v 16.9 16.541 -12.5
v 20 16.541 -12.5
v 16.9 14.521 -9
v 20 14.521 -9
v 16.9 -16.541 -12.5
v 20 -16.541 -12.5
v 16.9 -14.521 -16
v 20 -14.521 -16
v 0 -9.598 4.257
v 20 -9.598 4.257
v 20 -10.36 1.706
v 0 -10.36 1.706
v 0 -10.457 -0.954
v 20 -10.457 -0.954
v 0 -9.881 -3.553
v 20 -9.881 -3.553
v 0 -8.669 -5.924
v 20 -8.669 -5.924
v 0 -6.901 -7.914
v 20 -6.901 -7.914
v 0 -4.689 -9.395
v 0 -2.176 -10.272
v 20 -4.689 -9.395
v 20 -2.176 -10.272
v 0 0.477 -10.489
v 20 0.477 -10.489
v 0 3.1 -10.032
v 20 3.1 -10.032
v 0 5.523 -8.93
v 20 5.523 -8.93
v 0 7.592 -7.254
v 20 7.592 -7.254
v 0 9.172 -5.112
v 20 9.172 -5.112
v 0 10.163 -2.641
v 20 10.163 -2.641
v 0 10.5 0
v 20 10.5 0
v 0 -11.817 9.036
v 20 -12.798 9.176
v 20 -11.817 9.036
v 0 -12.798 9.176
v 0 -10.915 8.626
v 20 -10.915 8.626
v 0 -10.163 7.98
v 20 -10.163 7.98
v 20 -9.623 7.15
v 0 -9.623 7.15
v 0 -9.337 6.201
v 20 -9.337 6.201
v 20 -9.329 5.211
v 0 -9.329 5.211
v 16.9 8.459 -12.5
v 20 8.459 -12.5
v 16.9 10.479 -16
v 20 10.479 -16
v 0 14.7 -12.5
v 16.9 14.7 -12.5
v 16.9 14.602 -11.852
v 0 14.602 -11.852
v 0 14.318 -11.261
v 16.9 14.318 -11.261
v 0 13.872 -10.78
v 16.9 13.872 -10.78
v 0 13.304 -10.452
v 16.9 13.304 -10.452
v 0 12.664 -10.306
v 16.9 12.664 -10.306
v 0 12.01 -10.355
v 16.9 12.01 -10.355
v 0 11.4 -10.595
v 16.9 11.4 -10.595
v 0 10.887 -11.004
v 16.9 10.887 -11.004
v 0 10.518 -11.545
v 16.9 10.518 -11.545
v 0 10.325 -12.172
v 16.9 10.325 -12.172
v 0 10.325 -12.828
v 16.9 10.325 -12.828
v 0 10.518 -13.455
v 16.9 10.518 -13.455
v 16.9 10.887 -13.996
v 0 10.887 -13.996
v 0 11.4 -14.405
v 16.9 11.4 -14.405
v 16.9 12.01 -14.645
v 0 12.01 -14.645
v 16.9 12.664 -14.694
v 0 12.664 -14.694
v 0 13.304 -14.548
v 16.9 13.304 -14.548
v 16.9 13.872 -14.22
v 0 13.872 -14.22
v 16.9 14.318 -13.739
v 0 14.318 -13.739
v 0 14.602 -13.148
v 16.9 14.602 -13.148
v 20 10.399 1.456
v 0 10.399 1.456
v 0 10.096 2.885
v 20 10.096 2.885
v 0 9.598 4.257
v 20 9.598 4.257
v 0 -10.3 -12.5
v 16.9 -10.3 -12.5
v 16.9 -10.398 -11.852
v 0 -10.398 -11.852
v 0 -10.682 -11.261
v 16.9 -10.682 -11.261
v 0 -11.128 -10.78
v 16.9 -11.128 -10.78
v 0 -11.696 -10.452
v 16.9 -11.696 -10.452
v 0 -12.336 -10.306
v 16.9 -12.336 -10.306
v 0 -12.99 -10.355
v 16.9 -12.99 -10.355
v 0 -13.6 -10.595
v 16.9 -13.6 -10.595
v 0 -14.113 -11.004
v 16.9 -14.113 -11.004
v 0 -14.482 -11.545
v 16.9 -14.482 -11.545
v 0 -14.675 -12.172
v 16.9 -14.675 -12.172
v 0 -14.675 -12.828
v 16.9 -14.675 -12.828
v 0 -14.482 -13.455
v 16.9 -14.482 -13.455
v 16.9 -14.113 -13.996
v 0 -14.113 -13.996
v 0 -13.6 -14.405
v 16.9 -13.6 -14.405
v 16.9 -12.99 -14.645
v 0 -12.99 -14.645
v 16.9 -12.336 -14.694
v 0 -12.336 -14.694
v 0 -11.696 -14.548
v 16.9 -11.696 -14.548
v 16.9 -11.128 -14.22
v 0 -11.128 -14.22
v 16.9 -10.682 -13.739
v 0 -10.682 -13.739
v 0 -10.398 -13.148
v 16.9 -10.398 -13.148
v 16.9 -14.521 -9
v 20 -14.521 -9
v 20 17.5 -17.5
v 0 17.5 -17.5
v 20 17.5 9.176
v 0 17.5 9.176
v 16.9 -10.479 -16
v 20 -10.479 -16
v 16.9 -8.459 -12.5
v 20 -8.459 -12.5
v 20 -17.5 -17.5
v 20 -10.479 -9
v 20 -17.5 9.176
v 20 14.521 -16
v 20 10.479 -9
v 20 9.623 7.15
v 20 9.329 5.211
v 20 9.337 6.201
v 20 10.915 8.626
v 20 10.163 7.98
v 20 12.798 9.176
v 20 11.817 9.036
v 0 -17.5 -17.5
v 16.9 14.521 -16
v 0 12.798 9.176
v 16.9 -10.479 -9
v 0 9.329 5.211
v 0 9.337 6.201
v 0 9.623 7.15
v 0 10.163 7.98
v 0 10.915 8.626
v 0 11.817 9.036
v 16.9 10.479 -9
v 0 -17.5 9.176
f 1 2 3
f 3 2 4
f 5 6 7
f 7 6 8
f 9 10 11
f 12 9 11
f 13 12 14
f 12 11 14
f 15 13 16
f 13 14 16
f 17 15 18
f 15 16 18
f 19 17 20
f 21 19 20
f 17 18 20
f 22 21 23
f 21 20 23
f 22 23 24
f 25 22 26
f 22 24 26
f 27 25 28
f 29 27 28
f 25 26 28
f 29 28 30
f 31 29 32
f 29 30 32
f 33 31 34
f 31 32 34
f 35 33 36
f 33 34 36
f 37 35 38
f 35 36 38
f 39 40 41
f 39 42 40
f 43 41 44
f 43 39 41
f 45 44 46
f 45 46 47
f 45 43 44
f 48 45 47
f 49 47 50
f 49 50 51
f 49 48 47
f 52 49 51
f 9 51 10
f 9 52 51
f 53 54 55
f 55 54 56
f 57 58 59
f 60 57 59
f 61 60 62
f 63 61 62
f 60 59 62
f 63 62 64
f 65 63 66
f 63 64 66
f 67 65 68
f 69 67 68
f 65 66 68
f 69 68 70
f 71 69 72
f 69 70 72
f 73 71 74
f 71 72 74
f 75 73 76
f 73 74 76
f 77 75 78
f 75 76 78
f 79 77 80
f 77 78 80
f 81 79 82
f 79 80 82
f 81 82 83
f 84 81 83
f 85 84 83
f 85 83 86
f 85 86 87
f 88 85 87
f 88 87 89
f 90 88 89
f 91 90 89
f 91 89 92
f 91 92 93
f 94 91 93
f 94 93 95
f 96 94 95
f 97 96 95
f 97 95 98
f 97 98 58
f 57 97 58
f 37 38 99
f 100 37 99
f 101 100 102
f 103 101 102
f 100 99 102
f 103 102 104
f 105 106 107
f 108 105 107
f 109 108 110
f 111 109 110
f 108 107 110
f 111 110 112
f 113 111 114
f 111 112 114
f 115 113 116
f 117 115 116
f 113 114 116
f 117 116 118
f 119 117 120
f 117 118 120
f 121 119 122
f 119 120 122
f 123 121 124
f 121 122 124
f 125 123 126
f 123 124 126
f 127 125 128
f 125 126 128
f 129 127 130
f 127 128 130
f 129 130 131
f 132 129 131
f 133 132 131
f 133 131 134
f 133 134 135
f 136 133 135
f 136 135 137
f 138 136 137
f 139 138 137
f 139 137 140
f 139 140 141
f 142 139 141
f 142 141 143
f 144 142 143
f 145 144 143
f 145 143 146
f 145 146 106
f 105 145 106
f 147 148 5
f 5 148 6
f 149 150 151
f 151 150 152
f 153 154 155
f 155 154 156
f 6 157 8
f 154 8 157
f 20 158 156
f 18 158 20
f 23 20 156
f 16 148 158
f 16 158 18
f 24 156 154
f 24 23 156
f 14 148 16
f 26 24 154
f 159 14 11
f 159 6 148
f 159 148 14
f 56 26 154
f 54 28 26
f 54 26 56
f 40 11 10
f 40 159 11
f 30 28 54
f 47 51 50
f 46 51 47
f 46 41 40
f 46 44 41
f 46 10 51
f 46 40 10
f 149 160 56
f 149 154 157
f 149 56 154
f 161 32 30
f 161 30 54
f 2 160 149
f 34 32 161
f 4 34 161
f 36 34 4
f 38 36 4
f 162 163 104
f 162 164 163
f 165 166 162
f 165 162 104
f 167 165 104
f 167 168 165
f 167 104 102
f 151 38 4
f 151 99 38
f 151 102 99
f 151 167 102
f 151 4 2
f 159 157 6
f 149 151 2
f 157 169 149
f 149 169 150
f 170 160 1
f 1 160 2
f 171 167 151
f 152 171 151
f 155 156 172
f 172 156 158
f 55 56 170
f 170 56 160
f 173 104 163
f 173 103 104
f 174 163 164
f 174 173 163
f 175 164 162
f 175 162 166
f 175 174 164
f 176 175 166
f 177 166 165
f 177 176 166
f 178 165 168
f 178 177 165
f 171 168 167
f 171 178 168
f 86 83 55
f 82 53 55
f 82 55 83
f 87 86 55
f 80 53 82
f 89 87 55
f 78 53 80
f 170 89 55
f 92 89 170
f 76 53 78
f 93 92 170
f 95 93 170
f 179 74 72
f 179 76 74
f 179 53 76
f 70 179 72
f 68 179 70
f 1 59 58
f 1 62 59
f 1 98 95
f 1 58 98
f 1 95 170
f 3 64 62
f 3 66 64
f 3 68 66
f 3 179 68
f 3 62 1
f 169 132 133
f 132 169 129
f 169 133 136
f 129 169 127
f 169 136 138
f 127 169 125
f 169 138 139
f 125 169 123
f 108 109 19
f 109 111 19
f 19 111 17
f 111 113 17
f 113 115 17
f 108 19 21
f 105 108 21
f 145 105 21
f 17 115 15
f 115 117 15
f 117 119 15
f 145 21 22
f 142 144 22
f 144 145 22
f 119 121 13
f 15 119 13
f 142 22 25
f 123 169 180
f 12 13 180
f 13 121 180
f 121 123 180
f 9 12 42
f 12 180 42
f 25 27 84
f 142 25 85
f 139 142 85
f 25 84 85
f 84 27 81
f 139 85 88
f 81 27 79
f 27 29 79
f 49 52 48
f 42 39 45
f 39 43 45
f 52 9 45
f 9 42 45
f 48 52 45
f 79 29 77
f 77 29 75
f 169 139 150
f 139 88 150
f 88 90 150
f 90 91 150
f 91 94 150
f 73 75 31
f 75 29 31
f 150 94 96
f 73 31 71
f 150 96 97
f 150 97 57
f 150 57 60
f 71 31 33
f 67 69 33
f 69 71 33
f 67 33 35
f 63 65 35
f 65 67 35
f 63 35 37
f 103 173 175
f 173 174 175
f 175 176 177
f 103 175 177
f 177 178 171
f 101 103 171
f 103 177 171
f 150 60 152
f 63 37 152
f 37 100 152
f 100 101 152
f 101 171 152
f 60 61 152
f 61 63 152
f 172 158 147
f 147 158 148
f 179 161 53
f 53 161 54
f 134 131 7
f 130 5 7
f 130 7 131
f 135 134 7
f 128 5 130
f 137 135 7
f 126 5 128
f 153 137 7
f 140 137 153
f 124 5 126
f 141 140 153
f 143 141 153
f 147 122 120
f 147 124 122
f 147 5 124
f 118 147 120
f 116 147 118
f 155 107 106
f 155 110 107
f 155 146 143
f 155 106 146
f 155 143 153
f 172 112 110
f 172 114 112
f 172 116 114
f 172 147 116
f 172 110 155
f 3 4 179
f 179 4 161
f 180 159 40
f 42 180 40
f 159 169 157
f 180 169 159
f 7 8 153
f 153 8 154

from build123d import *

# Parameters (mm, degrees)
F0_W     = 35
F0_H     = 35
F1_DEPTH = 20
F3_DEPTH = 51.098119
F4_R     = 3.5
F6_DEPTH = 3.1
F8_D     = 4.4


with BuildPart() as f1:
    # F0 (on Right) → F1 (new body)
    with BuildSketch(Plane.YZ):
        Rectangle(F0_W, F0_H)
    extrude(amount=F1_DEPTH)

    # F2 (on face) → F3 (cut)
    with BuildSketch(Plane.YZ.offset(20)):
        with BuildLine():
            ThreePointArc((-5.10385, 9.176094), (-5.322573, -9.050979), (10.5, 0))
            ThreePointArc((10.5, 0), (9.050979, 5.322573), (5.10385, 9.176094))
            ThreePointArc((5.10385, 9.176094), (0, 10.5), (-5.10385, 9.176094))
        make_face()
        with BuildLine():
            ThreePointArc((-5.10385, 9.176094), (0, 10.5), (5.10385, 9.176094))
            Line((5.10385, 9.176094), (17.5, 9.176094))
            Line((17.5, 9.176094), (17.5, 17.5))
            Line((17.5, 17.5), (-17.5, 17.5))
            Line((-17.5, 17.5), (-17.5, 9.176094))
            Line((-17.5, 9.176094), (-5.10385, 9.176094))
        make_face()
    extrude(amount=-F3_DEPTH, mode=Mode.SUBTRACT)

    # F4
    f4_edges = [f1.edges().sort_by_distance(p)[0] for p in [
        (10, 5.10385, 9.176094),
        (10, -5.10385, 9.176094),
    ]]
    fillet(f4_edges, radius=F4_R)

    # F5 (on face) → F6 (cut)
    with BuildSketch(Plane.YZ.offset(20)):
        Polygon((10.479274, -16), (14.520726, -16), (16.541452, -12.5), (14.520726, -9), (10.479274, -9), (8.458548, -12.5), align=None)
        Polygon((-8.458548, -12.5), (-10.479274, -9), (-14.520726, -9), (-16.541452, -12.5), (-14.520726, -16), (-10.479274, -16), align=None)
    extrude(amount=-F6_DEPTH, mode=Mode.SUBTRACT)

    # F8 (through all)
    with Locations(Plane(origin=(0, 0, 0), x_dir=(0, -1, 0), z_dir=(-1, 0, 0))):
        with Locations((-12.5, -12.5), (12.5, -12.5)):
            Hole(F8_D / 2)


solid = f1.part
